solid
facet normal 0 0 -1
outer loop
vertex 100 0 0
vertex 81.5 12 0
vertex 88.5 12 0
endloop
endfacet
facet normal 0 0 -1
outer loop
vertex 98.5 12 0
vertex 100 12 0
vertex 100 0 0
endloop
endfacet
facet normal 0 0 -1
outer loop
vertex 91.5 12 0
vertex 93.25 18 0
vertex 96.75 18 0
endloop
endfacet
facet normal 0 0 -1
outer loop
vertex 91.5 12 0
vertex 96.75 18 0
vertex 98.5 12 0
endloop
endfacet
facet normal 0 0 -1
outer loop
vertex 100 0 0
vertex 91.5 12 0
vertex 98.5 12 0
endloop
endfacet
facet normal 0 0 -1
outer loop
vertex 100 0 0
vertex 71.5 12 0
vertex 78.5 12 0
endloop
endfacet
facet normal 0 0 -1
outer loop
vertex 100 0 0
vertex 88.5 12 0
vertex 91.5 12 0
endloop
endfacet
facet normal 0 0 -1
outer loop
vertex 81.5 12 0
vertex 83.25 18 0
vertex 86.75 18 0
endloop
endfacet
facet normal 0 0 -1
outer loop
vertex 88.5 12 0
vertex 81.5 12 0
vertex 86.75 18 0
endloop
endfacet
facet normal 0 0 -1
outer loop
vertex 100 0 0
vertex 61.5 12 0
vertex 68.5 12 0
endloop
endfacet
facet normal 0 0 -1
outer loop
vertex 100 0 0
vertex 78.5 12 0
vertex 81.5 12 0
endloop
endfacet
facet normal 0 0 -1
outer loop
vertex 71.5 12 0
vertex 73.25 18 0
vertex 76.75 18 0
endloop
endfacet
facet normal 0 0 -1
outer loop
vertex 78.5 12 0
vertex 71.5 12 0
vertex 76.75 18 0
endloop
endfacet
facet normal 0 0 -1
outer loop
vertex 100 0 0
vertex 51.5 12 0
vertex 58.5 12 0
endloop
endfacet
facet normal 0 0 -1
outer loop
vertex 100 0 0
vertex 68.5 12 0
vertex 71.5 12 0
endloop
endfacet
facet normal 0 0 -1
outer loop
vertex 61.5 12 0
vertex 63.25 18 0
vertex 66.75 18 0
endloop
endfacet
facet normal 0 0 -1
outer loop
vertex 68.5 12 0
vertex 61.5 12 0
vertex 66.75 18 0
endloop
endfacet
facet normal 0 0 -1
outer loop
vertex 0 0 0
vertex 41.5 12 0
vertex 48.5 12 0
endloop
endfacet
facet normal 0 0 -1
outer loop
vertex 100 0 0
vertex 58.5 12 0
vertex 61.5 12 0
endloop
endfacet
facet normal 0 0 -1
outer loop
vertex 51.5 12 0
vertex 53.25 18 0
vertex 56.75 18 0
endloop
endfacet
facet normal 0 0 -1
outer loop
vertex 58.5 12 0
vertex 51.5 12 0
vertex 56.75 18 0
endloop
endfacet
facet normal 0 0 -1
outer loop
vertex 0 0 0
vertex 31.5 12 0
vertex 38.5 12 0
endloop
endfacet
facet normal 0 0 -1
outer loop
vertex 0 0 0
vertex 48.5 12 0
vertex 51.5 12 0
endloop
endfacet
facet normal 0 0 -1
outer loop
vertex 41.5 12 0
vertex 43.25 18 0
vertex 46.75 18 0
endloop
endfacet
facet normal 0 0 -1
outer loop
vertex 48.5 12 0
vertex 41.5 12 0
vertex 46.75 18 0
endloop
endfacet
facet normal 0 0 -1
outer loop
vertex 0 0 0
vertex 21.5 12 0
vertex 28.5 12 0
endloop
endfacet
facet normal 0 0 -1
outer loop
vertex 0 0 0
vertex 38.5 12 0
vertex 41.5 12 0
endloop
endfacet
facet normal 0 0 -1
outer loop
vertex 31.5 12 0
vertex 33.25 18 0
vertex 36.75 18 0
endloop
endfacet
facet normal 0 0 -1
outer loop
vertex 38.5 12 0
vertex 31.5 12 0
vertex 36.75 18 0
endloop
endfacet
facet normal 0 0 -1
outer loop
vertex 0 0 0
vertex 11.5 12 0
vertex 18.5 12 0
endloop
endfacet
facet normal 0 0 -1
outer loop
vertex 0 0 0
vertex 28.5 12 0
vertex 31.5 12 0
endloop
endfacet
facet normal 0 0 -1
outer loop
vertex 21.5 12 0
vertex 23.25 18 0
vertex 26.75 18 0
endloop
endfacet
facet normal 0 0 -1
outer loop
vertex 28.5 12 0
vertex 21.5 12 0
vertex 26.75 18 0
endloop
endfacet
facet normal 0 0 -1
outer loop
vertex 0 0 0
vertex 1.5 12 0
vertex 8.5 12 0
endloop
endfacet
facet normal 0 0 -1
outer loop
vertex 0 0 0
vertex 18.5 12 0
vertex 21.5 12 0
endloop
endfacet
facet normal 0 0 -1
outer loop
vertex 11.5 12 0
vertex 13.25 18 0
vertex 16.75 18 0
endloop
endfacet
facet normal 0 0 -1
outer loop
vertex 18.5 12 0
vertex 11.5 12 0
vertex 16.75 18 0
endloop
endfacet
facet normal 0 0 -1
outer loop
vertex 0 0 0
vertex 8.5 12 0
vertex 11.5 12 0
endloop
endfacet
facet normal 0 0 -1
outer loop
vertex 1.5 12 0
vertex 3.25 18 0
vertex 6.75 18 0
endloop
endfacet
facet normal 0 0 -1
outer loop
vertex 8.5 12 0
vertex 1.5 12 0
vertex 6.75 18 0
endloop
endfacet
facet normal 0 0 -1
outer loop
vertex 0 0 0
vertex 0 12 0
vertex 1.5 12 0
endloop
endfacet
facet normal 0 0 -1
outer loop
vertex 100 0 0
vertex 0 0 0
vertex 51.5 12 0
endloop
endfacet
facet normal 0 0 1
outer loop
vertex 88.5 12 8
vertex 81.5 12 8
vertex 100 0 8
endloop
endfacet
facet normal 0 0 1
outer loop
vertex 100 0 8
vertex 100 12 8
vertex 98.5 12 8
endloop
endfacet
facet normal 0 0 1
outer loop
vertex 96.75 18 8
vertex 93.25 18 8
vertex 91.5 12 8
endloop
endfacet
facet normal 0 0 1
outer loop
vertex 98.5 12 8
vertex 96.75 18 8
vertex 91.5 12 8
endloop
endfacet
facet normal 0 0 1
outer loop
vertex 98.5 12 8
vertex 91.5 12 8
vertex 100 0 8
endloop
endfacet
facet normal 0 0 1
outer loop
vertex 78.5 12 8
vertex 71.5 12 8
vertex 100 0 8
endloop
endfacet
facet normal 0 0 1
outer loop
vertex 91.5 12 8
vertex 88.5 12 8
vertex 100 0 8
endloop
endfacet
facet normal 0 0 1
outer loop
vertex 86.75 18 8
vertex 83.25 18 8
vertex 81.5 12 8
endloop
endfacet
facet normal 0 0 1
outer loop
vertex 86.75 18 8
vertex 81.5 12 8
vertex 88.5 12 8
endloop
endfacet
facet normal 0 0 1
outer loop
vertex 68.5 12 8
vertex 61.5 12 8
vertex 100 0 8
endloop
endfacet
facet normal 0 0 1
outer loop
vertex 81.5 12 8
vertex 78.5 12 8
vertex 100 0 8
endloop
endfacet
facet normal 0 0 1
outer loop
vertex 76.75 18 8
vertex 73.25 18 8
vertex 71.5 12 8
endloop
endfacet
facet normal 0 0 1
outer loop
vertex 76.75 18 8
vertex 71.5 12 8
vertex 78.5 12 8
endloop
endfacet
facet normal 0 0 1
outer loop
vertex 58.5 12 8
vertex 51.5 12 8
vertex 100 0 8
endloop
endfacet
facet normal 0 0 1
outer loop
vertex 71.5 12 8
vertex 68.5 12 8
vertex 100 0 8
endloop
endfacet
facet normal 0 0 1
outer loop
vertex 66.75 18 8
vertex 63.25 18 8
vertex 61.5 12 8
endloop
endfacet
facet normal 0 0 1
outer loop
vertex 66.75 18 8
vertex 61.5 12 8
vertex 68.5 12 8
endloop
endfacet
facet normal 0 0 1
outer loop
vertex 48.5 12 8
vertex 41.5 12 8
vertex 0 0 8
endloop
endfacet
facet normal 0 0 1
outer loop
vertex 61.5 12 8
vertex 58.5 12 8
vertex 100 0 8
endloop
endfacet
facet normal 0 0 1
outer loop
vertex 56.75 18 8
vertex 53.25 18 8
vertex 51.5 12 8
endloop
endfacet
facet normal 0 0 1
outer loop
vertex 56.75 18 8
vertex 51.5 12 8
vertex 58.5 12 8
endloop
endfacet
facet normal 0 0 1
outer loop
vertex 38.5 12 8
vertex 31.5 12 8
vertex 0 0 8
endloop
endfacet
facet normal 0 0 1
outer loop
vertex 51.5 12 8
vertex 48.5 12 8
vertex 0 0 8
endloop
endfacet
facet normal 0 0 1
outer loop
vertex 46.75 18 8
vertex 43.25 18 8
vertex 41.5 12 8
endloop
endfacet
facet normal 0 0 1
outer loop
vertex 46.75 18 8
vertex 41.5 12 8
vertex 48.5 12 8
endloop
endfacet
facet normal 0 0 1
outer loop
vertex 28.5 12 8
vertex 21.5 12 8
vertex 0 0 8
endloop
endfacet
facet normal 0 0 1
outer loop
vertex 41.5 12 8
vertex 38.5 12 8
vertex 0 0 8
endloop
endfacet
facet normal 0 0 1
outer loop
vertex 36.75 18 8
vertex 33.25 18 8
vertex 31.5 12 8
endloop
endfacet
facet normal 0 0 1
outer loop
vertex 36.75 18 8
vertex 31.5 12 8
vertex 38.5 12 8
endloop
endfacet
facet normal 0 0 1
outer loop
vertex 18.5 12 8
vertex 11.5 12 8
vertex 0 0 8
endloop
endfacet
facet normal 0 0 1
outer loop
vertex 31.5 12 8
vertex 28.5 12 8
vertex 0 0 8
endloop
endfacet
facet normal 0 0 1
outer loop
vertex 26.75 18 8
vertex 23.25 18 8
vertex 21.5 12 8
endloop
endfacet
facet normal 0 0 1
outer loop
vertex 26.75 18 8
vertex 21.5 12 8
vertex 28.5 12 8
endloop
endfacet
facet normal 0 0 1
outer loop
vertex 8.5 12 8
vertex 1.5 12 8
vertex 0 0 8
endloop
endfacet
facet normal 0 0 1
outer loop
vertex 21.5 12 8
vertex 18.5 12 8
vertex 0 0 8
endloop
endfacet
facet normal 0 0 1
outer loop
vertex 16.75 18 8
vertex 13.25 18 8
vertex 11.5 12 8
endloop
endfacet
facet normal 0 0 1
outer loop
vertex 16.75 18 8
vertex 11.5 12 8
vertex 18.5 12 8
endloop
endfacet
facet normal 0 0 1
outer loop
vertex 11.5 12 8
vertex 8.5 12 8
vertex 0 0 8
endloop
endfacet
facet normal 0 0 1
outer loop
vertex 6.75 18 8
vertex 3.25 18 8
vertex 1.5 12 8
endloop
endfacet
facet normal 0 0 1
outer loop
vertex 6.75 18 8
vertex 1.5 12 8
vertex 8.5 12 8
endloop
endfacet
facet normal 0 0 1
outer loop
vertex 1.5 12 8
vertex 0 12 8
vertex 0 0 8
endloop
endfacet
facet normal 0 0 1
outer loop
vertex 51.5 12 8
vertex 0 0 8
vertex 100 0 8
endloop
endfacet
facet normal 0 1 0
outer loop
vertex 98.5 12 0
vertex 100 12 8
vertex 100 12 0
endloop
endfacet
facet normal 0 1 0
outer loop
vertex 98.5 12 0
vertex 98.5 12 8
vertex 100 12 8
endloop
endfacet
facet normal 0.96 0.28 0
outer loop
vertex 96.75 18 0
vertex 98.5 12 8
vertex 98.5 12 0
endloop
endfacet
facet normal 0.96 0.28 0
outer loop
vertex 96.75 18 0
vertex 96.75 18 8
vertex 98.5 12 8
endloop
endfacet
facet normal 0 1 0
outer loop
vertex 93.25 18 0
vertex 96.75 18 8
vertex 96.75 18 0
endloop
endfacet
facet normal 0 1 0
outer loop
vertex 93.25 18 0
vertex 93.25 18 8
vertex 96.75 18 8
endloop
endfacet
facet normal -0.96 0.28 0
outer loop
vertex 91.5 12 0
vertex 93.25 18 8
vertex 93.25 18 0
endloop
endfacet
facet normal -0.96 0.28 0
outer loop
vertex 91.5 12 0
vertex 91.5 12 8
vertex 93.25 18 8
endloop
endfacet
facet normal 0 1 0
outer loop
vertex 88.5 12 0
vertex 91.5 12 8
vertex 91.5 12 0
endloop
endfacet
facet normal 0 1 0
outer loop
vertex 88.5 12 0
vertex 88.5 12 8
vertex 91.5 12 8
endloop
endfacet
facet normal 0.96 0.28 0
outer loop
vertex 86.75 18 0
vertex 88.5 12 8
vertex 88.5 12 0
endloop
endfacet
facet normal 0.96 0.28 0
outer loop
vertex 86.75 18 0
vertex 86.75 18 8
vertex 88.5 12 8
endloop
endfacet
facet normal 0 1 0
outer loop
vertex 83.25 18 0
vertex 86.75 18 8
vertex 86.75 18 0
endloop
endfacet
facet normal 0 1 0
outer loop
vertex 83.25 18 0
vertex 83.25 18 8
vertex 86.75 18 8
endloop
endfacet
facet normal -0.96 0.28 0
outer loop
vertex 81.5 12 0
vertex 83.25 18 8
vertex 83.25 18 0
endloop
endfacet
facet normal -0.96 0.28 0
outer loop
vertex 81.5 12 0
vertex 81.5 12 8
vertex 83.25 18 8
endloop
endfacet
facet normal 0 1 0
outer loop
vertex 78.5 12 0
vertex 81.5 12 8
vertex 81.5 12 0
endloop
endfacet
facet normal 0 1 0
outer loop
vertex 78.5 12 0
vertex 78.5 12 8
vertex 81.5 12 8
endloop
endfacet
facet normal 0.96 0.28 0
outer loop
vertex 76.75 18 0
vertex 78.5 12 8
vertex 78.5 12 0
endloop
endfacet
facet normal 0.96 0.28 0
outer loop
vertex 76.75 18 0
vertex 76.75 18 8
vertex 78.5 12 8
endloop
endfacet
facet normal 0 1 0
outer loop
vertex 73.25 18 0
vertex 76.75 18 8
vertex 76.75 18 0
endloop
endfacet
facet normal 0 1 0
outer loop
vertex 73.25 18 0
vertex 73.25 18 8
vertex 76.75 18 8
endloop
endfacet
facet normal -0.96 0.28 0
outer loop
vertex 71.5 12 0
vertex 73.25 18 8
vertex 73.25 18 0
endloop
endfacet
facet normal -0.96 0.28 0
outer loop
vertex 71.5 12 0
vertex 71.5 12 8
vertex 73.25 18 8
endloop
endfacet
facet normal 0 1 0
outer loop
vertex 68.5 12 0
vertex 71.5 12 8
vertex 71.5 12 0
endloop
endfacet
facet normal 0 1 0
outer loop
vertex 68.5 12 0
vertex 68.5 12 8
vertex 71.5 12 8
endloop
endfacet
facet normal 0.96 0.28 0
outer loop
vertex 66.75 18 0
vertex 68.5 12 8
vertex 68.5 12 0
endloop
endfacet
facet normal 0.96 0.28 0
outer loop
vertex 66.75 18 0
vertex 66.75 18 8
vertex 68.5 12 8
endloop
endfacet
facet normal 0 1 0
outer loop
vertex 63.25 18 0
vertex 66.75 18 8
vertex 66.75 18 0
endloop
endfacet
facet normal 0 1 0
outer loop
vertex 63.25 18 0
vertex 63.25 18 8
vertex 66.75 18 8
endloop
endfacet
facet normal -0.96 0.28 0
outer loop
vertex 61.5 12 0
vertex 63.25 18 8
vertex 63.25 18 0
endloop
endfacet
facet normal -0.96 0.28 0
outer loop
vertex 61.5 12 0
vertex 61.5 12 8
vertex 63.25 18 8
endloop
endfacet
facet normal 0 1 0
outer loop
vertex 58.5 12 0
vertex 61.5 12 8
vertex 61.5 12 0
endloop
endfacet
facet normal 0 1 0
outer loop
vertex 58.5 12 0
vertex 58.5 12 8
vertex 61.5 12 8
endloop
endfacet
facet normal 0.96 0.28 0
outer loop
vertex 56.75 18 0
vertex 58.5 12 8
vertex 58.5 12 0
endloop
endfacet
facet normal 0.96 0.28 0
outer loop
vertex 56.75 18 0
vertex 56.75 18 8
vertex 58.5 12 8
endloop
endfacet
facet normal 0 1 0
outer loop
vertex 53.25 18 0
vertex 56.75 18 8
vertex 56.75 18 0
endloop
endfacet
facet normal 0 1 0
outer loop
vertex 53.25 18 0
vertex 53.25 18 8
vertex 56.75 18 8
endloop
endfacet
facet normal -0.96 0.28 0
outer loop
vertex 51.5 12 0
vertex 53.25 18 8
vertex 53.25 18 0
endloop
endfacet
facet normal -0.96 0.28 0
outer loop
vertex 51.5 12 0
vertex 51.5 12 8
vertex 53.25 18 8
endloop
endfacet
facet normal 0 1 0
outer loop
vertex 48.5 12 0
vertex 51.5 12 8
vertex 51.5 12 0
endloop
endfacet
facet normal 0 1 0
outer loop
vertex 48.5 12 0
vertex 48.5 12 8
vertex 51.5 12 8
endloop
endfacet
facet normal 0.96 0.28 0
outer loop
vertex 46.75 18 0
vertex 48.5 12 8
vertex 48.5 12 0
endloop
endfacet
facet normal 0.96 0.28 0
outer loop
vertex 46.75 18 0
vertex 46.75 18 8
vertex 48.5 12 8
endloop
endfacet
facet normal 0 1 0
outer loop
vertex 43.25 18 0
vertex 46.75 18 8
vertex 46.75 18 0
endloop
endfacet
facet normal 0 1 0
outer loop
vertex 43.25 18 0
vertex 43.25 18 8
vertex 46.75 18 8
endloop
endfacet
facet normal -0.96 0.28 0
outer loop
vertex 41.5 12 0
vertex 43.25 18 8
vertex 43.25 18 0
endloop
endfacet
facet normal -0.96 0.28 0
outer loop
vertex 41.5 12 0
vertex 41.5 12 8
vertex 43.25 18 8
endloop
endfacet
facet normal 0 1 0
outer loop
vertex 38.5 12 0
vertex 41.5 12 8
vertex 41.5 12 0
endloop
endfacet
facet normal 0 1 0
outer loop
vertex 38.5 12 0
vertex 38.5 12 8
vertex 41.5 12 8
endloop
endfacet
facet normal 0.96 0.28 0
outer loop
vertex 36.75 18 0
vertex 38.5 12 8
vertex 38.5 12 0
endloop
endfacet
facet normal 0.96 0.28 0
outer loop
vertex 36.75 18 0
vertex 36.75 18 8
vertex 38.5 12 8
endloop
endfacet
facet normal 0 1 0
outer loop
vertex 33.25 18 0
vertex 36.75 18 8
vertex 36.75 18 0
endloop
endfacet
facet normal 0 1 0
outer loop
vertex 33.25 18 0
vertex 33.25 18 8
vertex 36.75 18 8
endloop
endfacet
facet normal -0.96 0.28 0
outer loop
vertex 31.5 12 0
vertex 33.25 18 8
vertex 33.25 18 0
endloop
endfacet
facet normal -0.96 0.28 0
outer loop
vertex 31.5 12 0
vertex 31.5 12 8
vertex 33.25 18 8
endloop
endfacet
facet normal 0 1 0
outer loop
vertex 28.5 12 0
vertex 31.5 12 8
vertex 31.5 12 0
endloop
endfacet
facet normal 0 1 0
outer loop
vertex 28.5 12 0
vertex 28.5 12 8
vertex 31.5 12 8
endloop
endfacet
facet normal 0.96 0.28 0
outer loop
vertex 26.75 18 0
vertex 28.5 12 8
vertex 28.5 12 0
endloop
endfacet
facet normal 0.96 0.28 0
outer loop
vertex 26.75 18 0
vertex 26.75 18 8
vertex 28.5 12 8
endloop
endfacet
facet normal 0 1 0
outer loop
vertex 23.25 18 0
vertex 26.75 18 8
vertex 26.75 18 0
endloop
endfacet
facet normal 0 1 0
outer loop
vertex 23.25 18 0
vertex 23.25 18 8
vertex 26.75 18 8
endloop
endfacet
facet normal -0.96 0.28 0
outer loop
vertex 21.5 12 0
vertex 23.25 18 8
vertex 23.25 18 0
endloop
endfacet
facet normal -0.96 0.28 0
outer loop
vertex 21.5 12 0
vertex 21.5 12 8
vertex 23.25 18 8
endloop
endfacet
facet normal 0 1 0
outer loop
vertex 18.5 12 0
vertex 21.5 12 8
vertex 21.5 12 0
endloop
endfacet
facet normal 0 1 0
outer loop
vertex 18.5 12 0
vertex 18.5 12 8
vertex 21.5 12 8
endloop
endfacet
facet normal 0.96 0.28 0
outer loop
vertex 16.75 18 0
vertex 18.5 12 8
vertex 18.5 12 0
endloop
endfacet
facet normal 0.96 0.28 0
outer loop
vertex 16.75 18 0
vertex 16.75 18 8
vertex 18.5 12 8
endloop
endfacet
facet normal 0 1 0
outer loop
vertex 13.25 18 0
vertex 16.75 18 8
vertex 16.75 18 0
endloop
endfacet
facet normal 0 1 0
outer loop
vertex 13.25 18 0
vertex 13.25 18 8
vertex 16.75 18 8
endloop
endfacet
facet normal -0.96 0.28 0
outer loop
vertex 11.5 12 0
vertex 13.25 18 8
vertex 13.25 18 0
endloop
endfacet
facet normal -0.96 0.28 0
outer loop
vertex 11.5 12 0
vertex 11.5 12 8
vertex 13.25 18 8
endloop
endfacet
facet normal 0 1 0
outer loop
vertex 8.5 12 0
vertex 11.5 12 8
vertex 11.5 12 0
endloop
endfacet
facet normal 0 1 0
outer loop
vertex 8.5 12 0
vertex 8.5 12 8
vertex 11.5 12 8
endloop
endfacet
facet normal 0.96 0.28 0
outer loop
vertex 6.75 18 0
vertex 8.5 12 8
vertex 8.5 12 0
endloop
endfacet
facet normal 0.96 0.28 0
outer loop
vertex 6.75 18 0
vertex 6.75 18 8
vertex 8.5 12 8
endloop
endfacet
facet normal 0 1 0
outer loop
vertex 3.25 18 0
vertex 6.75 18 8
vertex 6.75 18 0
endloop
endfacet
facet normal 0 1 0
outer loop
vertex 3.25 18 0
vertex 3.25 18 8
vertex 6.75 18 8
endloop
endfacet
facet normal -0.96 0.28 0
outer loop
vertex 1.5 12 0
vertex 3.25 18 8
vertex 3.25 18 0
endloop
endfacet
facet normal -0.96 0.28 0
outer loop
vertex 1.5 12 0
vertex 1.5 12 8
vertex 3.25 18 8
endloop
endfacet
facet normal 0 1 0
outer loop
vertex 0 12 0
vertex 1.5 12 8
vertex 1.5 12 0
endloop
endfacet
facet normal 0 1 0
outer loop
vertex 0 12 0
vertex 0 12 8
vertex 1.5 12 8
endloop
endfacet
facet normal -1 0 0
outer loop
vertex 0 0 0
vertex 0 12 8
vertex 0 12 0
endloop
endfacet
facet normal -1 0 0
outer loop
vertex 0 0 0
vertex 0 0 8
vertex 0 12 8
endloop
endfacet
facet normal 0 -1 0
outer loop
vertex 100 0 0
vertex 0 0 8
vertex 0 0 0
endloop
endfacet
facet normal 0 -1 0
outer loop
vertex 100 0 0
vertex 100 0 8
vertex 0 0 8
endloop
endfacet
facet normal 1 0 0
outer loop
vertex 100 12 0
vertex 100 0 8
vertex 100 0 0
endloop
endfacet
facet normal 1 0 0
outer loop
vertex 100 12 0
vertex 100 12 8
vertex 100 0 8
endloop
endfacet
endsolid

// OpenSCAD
$fn = 32;

// ----------------------------------------------------------------------
// Gear rack: 10 teeth, pitch 10 mm
// ----------------------------------------------------------------------

// --- parameters (mm) ---
teeth = 10;               // number of teeth
pitch = 10;               // tooth pitch, X
root_w = 7;               // tooth width at the root
tip_w = 3.5;              // tooth width at the tip
base_h = 12;              // rack body height, Y
tooth_h = 6;              // tooth height above the body
plate_t = 8;              // rack width, Z (extrusion height)
fit_tol = 0.05;           // declared fit tolerance (prompt contract)
free_tol = 0.3;           // declared free tolerance (prompt contract)

rack_l = teeth * pitch;  // overall length
total_h = base_h + tooth_h;  // overall height

profile = [[0, 0], [100, 0], [100, 12], [98.5, 12], [96.75, 18], [93.25, 18], [91.5, 12], [88.5, 12], [86.75, 18], [83.25, 18], [81.5, 12], [78.5, 12], [76.75, 18], [73.25, 18], [71.5, 12], [68.5, 12], [66.75, 18], [63.25, 18], [61.5, 12], [58.5, 12], [56.75, 18], [53.25, 18], [51.5, 12], [48.5, 12], [46.75, 18], [43.25, 18], [41.5, 12], [38.5, 12], [36.75, 18], [33.25, 18], [31.5, 12], [28.5, 12], [26.75, 18], [23.25, 18], [21.5, 12], [18.5, 12], [16.75, 18], [13.25, 18], [11.5, 12], [8.5, 12], [6.75, 18], [3.25, 18], [1.5, 12], [0, 12]];  // primary outline, 44 points, counter clockwise

// --- the one profile operation ---
linear_extrude(height = plate_t) polygon(points = profile);
